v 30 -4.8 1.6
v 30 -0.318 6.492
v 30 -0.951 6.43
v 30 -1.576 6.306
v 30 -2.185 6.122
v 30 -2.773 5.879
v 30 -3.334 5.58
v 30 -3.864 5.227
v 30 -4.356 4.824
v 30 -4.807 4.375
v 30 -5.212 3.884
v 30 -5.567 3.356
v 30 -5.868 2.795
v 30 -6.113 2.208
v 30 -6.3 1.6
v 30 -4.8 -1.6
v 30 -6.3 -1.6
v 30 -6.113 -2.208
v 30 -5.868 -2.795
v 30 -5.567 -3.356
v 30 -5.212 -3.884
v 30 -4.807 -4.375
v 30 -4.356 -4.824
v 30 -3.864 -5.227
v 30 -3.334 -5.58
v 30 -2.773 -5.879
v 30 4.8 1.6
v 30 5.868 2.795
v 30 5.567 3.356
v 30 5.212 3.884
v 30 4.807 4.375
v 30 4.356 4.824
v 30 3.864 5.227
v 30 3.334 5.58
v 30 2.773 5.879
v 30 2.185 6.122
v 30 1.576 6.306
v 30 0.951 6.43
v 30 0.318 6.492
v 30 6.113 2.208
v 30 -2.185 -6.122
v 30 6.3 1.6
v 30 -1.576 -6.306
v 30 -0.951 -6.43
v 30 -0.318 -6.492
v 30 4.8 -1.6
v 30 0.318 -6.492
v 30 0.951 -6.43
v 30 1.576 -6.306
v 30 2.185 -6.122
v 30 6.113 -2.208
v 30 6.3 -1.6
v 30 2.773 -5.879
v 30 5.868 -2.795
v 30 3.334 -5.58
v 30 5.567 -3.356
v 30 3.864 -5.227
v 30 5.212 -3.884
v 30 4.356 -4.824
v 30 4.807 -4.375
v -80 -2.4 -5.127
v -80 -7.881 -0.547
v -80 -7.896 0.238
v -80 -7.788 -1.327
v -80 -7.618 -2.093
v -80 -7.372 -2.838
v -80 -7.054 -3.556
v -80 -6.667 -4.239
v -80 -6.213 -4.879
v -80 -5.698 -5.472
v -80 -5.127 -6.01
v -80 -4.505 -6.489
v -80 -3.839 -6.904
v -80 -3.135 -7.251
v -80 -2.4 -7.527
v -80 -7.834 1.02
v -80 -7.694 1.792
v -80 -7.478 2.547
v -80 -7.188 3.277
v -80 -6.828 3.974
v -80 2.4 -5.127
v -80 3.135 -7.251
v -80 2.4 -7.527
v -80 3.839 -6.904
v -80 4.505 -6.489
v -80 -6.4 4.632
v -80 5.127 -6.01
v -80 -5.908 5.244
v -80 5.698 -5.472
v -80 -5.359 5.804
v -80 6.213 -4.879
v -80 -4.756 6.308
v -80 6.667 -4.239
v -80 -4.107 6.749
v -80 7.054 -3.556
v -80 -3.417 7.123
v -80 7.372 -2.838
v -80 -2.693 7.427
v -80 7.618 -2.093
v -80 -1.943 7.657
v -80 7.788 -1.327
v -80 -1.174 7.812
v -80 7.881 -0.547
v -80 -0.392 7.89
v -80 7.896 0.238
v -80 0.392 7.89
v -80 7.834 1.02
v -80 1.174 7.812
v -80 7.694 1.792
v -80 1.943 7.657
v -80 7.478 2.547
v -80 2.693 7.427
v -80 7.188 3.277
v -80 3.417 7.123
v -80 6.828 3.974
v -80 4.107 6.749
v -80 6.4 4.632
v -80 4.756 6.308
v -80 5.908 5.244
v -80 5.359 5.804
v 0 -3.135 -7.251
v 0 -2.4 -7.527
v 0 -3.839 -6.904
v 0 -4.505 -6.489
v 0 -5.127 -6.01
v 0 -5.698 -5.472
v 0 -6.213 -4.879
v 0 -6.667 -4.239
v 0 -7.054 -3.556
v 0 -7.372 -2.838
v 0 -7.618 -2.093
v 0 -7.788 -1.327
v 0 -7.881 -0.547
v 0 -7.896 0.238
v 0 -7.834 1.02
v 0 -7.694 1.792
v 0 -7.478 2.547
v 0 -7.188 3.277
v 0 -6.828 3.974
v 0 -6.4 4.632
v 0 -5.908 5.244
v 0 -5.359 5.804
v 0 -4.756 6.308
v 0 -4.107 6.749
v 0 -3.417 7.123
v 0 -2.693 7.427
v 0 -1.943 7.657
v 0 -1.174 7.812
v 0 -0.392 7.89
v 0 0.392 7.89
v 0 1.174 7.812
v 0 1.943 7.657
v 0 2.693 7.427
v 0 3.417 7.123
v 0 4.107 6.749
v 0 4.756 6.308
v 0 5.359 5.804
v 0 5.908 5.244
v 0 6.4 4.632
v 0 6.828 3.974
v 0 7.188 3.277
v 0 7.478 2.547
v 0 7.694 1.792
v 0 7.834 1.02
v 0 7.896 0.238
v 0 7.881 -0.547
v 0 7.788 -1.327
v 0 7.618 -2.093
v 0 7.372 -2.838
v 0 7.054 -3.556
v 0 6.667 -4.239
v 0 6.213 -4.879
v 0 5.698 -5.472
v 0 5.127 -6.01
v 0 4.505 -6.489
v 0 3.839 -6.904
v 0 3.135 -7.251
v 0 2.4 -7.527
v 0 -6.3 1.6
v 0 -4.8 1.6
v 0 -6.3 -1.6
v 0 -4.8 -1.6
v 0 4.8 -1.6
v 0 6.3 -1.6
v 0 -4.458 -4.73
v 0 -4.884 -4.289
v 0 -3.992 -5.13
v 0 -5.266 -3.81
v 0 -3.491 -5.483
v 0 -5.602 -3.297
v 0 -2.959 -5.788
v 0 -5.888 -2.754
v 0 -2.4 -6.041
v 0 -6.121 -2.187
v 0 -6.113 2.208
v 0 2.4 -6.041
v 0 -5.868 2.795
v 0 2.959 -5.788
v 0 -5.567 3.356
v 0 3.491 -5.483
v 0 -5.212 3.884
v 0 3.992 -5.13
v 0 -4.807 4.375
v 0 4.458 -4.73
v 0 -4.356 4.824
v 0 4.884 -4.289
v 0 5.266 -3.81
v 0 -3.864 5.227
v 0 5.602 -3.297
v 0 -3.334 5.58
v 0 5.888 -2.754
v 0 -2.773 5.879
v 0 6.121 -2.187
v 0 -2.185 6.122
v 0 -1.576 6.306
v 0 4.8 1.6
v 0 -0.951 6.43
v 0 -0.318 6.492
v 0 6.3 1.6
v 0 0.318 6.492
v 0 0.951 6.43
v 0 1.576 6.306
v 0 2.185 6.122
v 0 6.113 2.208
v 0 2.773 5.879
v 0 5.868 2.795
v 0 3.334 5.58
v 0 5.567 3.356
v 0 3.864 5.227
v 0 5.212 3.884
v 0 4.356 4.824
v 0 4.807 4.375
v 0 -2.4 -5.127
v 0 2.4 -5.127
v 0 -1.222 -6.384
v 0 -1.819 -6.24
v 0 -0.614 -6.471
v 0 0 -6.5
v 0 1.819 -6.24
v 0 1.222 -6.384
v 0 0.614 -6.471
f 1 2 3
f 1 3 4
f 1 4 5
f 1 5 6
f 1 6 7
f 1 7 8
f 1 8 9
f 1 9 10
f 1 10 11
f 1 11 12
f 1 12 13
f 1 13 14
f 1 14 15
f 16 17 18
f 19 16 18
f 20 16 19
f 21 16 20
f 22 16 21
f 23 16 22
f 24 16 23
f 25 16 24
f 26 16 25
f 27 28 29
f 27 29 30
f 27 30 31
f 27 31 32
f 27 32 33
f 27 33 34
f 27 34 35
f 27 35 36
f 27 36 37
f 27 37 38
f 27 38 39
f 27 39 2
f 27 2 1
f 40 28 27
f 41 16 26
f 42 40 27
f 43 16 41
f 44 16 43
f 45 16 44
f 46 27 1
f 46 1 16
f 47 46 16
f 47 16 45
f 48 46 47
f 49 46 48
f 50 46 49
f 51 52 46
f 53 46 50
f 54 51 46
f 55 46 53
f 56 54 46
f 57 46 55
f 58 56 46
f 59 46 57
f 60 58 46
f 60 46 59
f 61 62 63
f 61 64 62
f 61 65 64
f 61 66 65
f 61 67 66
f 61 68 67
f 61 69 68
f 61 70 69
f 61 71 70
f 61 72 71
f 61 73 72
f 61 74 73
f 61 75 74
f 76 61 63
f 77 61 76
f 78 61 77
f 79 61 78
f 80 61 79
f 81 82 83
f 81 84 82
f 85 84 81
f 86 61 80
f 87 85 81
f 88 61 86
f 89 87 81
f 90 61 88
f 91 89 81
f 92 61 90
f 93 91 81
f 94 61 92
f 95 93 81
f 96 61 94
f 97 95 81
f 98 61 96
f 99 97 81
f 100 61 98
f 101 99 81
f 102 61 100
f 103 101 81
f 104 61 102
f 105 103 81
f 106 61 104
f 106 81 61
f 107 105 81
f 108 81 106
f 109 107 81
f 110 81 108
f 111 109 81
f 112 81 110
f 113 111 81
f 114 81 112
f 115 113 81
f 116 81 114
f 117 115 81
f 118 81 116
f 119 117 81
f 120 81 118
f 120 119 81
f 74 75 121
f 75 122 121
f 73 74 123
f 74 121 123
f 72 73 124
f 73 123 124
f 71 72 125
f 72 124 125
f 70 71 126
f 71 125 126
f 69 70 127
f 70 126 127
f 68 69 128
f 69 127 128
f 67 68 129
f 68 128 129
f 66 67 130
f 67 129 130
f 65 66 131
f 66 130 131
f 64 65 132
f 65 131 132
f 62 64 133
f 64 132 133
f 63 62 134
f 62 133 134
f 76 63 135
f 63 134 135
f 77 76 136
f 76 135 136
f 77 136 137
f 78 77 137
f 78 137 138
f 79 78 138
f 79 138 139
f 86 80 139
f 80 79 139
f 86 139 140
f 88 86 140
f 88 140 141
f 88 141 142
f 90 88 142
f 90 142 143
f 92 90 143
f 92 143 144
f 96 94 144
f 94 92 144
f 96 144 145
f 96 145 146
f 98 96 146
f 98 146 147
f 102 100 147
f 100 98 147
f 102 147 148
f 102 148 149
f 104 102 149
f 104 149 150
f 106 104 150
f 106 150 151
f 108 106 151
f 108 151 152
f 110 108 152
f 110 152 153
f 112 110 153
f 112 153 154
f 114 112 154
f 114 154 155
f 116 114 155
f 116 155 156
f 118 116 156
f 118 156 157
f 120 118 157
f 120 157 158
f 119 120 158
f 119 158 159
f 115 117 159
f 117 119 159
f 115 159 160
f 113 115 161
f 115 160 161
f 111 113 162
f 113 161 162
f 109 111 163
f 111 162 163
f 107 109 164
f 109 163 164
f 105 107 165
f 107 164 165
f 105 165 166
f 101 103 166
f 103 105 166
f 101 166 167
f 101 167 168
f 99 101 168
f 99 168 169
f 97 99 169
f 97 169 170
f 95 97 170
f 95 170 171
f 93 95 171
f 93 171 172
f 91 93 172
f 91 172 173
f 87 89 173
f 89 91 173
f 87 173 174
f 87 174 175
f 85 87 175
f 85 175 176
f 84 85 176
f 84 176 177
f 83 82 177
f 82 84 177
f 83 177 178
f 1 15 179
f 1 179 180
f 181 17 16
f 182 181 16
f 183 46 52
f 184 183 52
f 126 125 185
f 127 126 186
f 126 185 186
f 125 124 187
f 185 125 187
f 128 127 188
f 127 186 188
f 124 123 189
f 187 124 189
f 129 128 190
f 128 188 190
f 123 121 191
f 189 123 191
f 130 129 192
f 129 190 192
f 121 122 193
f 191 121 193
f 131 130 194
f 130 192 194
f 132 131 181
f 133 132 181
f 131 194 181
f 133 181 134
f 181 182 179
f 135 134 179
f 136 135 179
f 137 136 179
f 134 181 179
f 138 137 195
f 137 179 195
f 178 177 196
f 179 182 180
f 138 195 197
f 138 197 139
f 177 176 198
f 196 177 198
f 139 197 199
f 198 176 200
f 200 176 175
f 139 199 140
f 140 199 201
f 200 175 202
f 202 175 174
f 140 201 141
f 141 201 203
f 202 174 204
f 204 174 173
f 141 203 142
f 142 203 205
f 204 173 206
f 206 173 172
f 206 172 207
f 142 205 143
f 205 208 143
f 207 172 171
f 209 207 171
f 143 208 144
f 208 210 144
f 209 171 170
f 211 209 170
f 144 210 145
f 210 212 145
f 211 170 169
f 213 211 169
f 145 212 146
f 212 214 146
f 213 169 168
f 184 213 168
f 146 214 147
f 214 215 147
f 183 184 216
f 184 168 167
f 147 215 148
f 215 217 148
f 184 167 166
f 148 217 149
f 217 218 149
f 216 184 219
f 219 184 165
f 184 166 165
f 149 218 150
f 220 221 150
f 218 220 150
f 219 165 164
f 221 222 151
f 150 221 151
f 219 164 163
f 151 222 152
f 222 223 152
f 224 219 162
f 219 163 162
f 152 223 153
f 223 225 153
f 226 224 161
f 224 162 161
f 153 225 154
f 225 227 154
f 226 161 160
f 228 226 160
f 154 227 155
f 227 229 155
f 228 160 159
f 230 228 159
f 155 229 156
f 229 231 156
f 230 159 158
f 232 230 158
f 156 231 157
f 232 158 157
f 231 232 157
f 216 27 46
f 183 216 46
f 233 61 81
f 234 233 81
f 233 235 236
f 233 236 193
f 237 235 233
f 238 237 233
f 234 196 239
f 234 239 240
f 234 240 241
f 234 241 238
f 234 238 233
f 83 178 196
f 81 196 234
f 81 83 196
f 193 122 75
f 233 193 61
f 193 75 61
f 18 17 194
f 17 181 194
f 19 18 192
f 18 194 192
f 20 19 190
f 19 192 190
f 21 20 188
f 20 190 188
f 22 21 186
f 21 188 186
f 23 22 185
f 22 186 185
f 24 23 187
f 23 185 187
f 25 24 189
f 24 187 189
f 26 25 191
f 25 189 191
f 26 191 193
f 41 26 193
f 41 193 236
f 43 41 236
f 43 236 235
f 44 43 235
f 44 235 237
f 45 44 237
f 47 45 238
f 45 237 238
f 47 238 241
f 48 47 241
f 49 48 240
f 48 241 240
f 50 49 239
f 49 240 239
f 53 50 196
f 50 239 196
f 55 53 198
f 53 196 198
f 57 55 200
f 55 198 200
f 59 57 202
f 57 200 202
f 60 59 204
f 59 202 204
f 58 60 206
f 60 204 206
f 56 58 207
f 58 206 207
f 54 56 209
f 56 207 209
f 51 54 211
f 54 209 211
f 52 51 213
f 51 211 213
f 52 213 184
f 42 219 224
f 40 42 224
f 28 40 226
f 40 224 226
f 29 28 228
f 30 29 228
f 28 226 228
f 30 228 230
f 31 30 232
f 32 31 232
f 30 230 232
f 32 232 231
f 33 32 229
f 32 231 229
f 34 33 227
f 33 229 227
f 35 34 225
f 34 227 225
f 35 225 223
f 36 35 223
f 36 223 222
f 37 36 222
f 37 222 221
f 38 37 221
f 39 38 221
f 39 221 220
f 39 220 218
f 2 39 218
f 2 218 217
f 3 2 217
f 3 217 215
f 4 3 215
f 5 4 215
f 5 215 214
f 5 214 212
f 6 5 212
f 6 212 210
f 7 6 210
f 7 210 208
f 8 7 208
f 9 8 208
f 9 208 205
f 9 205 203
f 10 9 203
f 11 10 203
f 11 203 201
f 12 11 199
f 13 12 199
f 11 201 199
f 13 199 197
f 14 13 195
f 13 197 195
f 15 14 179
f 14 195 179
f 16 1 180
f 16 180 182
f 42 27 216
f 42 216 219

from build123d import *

# Parameters (mm, degrees)
SKETCH1_R           = 6.5
BOSS_EXTRUDE1_DEPTH = 30
SKETCH2_R           = 7.9
BOSS_EXTRUDE2_DEPTH = 80
SKETCH3_W           = 3.2
SKETCH3_H           = 2
CUT_EXTRUDE2_DEPTH  = 30
SKETCH5_W           = 3
SKETCH5_H           = 4.8
CUT_EXTRUDE3_DEPTH  = 80


with BuildPart() as part:
    # Sketch1 → Boss-Extrude1 (new body)
    with BuildSketch(Plane(origin=(0, 0, 0), x_dir=(0, 0, -1), z_dir=(1, 0, 0))):
        Circle(SKETCH1_R)
    extrude(amount=BOSS_EXTRUDE1_DEPTH)

    # Sketch2 → Boss-Extrude2 (add)
    with BuildSketch(Plane.ZY):
        Circle(SKETCH2_R)
    extrude(amount=BOSS_EXTRUDE2_DEPTH)

    # Sketch3 → Cut-Extrude2 (cut)
    with BuildSketch(Plane(origin=(30, 0, 0), x_dir=(0, 0, -1), z_dir=(1, 0, 0))):
        with Locations((0, 5.8)):
            Rectangle(SKETCH3_W, SKETCH3_H)
        with Locations((0, -5.8)):
            Rectangle(SKETCH3_W, SKETCH3_H)
    extrude(amount=-CUT_EXTRUDE2_DEPTH, mode=Mode.SUBTRACT)

    # Sketch5 → Cut-Extrude3 (cut)
    with BuildSketch(Plane.ZY.offset(80)):
        with Locations((-6.626619427, 0)):
            Rectangle(SKETCH5_W, SKETCH5_H)
    extrude(amount=-CUT_EXTRUDE3_DEPTH, mode=Mode.SUBTRACT)


solid = part.part
